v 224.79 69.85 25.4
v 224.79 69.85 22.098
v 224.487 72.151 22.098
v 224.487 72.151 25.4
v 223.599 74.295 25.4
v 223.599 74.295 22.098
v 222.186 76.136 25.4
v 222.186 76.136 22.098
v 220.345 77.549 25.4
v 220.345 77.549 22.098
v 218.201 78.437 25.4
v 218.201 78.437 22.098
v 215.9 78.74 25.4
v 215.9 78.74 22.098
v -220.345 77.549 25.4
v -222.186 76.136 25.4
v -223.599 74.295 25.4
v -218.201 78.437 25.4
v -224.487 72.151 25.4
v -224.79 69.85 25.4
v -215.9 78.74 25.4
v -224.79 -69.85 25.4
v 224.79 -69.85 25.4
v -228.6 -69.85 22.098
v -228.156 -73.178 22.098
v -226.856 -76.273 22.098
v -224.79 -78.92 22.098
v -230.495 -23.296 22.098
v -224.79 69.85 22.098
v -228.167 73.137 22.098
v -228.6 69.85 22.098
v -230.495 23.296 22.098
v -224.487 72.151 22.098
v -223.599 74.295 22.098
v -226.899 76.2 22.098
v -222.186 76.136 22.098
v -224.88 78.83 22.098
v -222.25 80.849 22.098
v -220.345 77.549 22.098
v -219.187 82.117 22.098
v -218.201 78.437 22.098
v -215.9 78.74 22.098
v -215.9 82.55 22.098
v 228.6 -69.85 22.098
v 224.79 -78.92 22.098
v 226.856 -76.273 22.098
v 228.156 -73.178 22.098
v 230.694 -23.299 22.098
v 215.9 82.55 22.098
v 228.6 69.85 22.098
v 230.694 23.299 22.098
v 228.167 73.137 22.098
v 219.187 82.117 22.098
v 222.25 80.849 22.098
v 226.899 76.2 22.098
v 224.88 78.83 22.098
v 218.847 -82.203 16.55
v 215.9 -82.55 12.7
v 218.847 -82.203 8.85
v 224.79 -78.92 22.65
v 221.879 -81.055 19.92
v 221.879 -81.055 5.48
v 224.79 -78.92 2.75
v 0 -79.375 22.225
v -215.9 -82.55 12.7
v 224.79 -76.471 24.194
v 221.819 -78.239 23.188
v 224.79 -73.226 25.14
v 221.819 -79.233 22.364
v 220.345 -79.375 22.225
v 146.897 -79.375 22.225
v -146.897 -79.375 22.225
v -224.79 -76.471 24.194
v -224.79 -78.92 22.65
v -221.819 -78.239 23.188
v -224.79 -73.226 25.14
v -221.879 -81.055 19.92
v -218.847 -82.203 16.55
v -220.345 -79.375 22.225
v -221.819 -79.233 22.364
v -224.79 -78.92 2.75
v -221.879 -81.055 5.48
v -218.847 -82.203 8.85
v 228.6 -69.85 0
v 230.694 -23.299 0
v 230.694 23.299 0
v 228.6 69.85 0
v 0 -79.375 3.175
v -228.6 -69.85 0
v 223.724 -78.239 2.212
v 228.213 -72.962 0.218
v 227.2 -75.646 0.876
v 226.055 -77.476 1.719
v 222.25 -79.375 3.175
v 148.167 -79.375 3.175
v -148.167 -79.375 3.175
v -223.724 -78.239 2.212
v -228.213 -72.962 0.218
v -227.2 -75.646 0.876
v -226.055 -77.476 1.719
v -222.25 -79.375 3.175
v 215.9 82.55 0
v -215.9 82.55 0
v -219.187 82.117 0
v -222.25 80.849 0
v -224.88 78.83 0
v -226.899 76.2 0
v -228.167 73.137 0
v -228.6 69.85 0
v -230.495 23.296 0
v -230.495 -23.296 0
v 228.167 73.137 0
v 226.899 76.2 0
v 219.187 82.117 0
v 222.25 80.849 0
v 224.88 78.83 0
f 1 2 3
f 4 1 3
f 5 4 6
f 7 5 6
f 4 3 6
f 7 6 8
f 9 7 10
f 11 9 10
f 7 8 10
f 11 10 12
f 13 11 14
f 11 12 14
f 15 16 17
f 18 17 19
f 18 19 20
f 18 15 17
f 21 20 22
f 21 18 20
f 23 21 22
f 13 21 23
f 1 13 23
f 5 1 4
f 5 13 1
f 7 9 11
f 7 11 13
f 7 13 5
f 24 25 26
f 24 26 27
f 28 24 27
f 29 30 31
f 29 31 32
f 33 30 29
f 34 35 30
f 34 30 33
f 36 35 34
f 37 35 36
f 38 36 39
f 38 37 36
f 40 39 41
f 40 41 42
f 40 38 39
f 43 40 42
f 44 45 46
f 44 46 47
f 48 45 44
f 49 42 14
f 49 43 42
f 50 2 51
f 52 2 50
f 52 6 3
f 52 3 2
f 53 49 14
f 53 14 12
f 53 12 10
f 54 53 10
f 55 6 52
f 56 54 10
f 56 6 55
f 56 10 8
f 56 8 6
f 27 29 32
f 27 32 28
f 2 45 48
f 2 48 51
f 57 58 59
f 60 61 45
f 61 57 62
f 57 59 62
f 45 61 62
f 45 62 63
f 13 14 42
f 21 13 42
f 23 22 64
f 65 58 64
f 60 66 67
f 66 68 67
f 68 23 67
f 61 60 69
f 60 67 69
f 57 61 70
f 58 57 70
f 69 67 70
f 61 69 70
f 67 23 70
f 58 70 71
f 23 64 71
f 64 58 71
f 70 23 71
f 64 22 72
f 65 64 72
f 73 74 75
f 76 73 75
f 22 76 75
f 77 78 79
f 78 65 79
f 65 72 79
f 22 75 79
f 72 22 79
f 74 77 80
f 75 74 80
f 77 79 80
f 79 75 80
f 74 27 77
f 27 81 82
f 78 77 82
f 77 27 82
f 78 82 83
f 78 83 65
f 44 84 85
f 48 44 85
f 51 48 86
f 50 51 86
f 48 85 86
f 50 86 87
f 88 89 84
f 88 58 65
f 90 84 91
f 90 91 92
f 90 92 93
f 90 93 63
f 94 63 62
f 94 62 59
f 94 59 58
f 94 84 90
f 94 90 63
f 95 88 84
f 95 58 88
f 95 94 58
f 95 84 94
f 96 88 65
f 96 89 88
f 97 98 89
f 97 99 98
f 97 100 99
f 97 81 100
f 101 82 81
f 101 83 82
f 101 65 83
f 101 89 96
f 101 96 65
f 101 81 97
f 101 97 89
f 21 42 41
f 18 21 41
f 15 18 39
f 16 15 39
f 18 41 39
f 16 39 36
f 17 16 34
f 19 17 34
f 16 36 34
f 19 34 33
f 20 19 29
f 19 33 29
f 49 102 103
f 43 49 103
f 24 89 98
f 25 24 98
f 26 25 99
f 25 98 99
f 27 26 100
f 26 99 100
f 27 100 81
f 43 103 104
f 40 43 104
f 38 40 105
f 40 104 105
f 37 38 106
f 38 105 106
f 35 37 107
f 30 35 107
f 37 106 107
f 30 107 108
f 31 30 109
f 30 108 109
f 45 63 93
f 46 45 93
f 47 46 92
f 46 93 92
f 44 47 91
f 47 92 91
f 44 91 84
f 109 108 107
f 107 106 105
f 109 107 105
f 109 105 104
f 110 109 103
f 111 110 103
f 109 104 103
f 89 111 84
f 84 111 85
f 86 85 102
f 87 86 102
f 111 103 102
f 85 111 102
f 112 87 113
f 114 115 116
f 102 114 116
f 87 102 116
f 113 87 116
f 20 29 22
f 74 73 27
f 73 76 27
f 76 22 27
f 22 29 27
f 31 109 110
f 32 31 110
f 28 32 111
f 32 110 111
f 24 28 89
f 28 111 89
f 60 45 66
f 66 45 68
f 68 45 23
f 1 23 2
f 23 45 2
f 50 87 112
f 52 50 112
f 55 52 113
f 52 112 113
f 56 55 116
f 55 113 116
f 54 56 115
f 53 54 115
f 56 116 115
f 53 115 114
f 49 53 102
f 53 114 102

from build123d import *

# Parameters (mm, degrees)
F1_DEPTH    = 25.4
F2_DEPTH    = 22.098
F3_T1_DEPTH = 495.3


# Not quite as in the source:
# - a fillet or chamfer that OpenCascade refuses, or shapes differently, is made with other operations: its cross-section is extruded or revolved along the edge and cut away or added


with BuildPart() as f1:
    # F0 (on Top) → F1 (new body)
    with BuildSketch(Plane.XY):
        with BuildLine():
            ThreePointArc((215.9, -82.55), (220.7013488144, -81.6074252948), (224.79, -78.9196141042))
            Line((224.79, -78.9196141042), (224.79, -69.85))
            Line((224.79, -69.85), (224.79, 69.85))
            ThreePointArc((224.79, 69.85), (222.1861792847, 76.1361792847), (215.9, 78.74))
            Line((215.9, 78.74), (-215.9, 78.74))
            ThreePointArc((-215.9, 78.74), (-222.1861792847, 76.1361792847), (-224.79, 69.85))
            Line((-224.79, 69.85), (-224.79, -69.85))
            Line((-224.79, -69.85), (-224.79, -78.9196141042))
            ThreePointArc((-224.79, -78.9196141042), (-220.7013488144, -81.6074252948), (-215.9, -82.55))
            Line((-215.9, -82.55), (215.9, -82.55))
        make_face()
    extrude(amount=F1_DEPTH)

    # F0 (on Top) → F2 (join)
    with BuildSketch(Plane.XY):
        with BuildLine():
            ThreePointArc((228.6, 69.85), (224.8802561211, 78.8302561211), (215.9, 82.55))
            Line((215.9, 82.55), (-215.9, 82.55))
            ThreePointArc((-215.9, 82.55), (-224.8802561211, 78.8302561211), (-228.6, 69.85))
            ThreePointArc((-228.6, 69.85), (-230.7318859092, 0), (-228.6, -69.85))
            ThreePointArc((-228.6, -69.85), (-227.6088214608, -74.7686888497), (-224.79, -78.9196141042))
            Line((-224.79, -78.9196141042), (-224.79, -69.85))
            Line((-224.79, -69.85), (-224.79, 69.85))
            ThreePointArc((-224.79, 69.85), (-222.1861792847, 76.1361792847), (-215.9, 78.74))
            Line((-215.9, 78.74), (215.9, 78.74))
            ThreePointArc((215.9, 78.74), (222.1861792847, 76.1361792847), (224.79, 69.85))
            Line((224.79, 69.85), (224.79, -69.85))
            Line((224.79, -69.85), (224.79, -78.9196141042))
            ThreePointArc((224.79, -78.9196141042), (227.6088214608, -74.7686888497), (228.6, -69.85))
            ThreePointArc((228.6, -69.85), (230.9555402084, 0), (228.6, 69.85))
        make_face()
    extrude(amount=F2_DEPTH)

    # F3: fillet of radius 12.7 on 4 edges, made by hand

    # F3_s2 → F3_t1 (cut)
    with BuildSketch(Plane.YZ.offset(-247.65)):
        with BuildLine():
            add(Edge.make_bspline(
                [(-69.85, 0), (-82.55, 0), (-82.55, 12.7)],
                knots=[0, 0, 0, 1, 1, 1], degree=2, weights=[1, 1, 1]))
            Line((-82.55, 12.7), (-82.55, 0))
            Line((-82.55, 0), (-69.85, 0))
        make_face()
        with BuildLine():
            add(Edge.make_bspline(
                [(-69.85, 25.4), (-82.55, 25.4), (-82.55, 12.7)],
                knots=[0, 0, 0, 1, 1, 1], degree=2, weights=[1, 1, 1]))
            Line((-82.55, 12.7), (-82.55, 25.4))
            Line((-82.55, 25.4), (-69.85, 25.4))
        make_face()
    extrude(amount=F3_T1_DEPTH, mode=Mode.SUBTRACT)


solid = f1.part
